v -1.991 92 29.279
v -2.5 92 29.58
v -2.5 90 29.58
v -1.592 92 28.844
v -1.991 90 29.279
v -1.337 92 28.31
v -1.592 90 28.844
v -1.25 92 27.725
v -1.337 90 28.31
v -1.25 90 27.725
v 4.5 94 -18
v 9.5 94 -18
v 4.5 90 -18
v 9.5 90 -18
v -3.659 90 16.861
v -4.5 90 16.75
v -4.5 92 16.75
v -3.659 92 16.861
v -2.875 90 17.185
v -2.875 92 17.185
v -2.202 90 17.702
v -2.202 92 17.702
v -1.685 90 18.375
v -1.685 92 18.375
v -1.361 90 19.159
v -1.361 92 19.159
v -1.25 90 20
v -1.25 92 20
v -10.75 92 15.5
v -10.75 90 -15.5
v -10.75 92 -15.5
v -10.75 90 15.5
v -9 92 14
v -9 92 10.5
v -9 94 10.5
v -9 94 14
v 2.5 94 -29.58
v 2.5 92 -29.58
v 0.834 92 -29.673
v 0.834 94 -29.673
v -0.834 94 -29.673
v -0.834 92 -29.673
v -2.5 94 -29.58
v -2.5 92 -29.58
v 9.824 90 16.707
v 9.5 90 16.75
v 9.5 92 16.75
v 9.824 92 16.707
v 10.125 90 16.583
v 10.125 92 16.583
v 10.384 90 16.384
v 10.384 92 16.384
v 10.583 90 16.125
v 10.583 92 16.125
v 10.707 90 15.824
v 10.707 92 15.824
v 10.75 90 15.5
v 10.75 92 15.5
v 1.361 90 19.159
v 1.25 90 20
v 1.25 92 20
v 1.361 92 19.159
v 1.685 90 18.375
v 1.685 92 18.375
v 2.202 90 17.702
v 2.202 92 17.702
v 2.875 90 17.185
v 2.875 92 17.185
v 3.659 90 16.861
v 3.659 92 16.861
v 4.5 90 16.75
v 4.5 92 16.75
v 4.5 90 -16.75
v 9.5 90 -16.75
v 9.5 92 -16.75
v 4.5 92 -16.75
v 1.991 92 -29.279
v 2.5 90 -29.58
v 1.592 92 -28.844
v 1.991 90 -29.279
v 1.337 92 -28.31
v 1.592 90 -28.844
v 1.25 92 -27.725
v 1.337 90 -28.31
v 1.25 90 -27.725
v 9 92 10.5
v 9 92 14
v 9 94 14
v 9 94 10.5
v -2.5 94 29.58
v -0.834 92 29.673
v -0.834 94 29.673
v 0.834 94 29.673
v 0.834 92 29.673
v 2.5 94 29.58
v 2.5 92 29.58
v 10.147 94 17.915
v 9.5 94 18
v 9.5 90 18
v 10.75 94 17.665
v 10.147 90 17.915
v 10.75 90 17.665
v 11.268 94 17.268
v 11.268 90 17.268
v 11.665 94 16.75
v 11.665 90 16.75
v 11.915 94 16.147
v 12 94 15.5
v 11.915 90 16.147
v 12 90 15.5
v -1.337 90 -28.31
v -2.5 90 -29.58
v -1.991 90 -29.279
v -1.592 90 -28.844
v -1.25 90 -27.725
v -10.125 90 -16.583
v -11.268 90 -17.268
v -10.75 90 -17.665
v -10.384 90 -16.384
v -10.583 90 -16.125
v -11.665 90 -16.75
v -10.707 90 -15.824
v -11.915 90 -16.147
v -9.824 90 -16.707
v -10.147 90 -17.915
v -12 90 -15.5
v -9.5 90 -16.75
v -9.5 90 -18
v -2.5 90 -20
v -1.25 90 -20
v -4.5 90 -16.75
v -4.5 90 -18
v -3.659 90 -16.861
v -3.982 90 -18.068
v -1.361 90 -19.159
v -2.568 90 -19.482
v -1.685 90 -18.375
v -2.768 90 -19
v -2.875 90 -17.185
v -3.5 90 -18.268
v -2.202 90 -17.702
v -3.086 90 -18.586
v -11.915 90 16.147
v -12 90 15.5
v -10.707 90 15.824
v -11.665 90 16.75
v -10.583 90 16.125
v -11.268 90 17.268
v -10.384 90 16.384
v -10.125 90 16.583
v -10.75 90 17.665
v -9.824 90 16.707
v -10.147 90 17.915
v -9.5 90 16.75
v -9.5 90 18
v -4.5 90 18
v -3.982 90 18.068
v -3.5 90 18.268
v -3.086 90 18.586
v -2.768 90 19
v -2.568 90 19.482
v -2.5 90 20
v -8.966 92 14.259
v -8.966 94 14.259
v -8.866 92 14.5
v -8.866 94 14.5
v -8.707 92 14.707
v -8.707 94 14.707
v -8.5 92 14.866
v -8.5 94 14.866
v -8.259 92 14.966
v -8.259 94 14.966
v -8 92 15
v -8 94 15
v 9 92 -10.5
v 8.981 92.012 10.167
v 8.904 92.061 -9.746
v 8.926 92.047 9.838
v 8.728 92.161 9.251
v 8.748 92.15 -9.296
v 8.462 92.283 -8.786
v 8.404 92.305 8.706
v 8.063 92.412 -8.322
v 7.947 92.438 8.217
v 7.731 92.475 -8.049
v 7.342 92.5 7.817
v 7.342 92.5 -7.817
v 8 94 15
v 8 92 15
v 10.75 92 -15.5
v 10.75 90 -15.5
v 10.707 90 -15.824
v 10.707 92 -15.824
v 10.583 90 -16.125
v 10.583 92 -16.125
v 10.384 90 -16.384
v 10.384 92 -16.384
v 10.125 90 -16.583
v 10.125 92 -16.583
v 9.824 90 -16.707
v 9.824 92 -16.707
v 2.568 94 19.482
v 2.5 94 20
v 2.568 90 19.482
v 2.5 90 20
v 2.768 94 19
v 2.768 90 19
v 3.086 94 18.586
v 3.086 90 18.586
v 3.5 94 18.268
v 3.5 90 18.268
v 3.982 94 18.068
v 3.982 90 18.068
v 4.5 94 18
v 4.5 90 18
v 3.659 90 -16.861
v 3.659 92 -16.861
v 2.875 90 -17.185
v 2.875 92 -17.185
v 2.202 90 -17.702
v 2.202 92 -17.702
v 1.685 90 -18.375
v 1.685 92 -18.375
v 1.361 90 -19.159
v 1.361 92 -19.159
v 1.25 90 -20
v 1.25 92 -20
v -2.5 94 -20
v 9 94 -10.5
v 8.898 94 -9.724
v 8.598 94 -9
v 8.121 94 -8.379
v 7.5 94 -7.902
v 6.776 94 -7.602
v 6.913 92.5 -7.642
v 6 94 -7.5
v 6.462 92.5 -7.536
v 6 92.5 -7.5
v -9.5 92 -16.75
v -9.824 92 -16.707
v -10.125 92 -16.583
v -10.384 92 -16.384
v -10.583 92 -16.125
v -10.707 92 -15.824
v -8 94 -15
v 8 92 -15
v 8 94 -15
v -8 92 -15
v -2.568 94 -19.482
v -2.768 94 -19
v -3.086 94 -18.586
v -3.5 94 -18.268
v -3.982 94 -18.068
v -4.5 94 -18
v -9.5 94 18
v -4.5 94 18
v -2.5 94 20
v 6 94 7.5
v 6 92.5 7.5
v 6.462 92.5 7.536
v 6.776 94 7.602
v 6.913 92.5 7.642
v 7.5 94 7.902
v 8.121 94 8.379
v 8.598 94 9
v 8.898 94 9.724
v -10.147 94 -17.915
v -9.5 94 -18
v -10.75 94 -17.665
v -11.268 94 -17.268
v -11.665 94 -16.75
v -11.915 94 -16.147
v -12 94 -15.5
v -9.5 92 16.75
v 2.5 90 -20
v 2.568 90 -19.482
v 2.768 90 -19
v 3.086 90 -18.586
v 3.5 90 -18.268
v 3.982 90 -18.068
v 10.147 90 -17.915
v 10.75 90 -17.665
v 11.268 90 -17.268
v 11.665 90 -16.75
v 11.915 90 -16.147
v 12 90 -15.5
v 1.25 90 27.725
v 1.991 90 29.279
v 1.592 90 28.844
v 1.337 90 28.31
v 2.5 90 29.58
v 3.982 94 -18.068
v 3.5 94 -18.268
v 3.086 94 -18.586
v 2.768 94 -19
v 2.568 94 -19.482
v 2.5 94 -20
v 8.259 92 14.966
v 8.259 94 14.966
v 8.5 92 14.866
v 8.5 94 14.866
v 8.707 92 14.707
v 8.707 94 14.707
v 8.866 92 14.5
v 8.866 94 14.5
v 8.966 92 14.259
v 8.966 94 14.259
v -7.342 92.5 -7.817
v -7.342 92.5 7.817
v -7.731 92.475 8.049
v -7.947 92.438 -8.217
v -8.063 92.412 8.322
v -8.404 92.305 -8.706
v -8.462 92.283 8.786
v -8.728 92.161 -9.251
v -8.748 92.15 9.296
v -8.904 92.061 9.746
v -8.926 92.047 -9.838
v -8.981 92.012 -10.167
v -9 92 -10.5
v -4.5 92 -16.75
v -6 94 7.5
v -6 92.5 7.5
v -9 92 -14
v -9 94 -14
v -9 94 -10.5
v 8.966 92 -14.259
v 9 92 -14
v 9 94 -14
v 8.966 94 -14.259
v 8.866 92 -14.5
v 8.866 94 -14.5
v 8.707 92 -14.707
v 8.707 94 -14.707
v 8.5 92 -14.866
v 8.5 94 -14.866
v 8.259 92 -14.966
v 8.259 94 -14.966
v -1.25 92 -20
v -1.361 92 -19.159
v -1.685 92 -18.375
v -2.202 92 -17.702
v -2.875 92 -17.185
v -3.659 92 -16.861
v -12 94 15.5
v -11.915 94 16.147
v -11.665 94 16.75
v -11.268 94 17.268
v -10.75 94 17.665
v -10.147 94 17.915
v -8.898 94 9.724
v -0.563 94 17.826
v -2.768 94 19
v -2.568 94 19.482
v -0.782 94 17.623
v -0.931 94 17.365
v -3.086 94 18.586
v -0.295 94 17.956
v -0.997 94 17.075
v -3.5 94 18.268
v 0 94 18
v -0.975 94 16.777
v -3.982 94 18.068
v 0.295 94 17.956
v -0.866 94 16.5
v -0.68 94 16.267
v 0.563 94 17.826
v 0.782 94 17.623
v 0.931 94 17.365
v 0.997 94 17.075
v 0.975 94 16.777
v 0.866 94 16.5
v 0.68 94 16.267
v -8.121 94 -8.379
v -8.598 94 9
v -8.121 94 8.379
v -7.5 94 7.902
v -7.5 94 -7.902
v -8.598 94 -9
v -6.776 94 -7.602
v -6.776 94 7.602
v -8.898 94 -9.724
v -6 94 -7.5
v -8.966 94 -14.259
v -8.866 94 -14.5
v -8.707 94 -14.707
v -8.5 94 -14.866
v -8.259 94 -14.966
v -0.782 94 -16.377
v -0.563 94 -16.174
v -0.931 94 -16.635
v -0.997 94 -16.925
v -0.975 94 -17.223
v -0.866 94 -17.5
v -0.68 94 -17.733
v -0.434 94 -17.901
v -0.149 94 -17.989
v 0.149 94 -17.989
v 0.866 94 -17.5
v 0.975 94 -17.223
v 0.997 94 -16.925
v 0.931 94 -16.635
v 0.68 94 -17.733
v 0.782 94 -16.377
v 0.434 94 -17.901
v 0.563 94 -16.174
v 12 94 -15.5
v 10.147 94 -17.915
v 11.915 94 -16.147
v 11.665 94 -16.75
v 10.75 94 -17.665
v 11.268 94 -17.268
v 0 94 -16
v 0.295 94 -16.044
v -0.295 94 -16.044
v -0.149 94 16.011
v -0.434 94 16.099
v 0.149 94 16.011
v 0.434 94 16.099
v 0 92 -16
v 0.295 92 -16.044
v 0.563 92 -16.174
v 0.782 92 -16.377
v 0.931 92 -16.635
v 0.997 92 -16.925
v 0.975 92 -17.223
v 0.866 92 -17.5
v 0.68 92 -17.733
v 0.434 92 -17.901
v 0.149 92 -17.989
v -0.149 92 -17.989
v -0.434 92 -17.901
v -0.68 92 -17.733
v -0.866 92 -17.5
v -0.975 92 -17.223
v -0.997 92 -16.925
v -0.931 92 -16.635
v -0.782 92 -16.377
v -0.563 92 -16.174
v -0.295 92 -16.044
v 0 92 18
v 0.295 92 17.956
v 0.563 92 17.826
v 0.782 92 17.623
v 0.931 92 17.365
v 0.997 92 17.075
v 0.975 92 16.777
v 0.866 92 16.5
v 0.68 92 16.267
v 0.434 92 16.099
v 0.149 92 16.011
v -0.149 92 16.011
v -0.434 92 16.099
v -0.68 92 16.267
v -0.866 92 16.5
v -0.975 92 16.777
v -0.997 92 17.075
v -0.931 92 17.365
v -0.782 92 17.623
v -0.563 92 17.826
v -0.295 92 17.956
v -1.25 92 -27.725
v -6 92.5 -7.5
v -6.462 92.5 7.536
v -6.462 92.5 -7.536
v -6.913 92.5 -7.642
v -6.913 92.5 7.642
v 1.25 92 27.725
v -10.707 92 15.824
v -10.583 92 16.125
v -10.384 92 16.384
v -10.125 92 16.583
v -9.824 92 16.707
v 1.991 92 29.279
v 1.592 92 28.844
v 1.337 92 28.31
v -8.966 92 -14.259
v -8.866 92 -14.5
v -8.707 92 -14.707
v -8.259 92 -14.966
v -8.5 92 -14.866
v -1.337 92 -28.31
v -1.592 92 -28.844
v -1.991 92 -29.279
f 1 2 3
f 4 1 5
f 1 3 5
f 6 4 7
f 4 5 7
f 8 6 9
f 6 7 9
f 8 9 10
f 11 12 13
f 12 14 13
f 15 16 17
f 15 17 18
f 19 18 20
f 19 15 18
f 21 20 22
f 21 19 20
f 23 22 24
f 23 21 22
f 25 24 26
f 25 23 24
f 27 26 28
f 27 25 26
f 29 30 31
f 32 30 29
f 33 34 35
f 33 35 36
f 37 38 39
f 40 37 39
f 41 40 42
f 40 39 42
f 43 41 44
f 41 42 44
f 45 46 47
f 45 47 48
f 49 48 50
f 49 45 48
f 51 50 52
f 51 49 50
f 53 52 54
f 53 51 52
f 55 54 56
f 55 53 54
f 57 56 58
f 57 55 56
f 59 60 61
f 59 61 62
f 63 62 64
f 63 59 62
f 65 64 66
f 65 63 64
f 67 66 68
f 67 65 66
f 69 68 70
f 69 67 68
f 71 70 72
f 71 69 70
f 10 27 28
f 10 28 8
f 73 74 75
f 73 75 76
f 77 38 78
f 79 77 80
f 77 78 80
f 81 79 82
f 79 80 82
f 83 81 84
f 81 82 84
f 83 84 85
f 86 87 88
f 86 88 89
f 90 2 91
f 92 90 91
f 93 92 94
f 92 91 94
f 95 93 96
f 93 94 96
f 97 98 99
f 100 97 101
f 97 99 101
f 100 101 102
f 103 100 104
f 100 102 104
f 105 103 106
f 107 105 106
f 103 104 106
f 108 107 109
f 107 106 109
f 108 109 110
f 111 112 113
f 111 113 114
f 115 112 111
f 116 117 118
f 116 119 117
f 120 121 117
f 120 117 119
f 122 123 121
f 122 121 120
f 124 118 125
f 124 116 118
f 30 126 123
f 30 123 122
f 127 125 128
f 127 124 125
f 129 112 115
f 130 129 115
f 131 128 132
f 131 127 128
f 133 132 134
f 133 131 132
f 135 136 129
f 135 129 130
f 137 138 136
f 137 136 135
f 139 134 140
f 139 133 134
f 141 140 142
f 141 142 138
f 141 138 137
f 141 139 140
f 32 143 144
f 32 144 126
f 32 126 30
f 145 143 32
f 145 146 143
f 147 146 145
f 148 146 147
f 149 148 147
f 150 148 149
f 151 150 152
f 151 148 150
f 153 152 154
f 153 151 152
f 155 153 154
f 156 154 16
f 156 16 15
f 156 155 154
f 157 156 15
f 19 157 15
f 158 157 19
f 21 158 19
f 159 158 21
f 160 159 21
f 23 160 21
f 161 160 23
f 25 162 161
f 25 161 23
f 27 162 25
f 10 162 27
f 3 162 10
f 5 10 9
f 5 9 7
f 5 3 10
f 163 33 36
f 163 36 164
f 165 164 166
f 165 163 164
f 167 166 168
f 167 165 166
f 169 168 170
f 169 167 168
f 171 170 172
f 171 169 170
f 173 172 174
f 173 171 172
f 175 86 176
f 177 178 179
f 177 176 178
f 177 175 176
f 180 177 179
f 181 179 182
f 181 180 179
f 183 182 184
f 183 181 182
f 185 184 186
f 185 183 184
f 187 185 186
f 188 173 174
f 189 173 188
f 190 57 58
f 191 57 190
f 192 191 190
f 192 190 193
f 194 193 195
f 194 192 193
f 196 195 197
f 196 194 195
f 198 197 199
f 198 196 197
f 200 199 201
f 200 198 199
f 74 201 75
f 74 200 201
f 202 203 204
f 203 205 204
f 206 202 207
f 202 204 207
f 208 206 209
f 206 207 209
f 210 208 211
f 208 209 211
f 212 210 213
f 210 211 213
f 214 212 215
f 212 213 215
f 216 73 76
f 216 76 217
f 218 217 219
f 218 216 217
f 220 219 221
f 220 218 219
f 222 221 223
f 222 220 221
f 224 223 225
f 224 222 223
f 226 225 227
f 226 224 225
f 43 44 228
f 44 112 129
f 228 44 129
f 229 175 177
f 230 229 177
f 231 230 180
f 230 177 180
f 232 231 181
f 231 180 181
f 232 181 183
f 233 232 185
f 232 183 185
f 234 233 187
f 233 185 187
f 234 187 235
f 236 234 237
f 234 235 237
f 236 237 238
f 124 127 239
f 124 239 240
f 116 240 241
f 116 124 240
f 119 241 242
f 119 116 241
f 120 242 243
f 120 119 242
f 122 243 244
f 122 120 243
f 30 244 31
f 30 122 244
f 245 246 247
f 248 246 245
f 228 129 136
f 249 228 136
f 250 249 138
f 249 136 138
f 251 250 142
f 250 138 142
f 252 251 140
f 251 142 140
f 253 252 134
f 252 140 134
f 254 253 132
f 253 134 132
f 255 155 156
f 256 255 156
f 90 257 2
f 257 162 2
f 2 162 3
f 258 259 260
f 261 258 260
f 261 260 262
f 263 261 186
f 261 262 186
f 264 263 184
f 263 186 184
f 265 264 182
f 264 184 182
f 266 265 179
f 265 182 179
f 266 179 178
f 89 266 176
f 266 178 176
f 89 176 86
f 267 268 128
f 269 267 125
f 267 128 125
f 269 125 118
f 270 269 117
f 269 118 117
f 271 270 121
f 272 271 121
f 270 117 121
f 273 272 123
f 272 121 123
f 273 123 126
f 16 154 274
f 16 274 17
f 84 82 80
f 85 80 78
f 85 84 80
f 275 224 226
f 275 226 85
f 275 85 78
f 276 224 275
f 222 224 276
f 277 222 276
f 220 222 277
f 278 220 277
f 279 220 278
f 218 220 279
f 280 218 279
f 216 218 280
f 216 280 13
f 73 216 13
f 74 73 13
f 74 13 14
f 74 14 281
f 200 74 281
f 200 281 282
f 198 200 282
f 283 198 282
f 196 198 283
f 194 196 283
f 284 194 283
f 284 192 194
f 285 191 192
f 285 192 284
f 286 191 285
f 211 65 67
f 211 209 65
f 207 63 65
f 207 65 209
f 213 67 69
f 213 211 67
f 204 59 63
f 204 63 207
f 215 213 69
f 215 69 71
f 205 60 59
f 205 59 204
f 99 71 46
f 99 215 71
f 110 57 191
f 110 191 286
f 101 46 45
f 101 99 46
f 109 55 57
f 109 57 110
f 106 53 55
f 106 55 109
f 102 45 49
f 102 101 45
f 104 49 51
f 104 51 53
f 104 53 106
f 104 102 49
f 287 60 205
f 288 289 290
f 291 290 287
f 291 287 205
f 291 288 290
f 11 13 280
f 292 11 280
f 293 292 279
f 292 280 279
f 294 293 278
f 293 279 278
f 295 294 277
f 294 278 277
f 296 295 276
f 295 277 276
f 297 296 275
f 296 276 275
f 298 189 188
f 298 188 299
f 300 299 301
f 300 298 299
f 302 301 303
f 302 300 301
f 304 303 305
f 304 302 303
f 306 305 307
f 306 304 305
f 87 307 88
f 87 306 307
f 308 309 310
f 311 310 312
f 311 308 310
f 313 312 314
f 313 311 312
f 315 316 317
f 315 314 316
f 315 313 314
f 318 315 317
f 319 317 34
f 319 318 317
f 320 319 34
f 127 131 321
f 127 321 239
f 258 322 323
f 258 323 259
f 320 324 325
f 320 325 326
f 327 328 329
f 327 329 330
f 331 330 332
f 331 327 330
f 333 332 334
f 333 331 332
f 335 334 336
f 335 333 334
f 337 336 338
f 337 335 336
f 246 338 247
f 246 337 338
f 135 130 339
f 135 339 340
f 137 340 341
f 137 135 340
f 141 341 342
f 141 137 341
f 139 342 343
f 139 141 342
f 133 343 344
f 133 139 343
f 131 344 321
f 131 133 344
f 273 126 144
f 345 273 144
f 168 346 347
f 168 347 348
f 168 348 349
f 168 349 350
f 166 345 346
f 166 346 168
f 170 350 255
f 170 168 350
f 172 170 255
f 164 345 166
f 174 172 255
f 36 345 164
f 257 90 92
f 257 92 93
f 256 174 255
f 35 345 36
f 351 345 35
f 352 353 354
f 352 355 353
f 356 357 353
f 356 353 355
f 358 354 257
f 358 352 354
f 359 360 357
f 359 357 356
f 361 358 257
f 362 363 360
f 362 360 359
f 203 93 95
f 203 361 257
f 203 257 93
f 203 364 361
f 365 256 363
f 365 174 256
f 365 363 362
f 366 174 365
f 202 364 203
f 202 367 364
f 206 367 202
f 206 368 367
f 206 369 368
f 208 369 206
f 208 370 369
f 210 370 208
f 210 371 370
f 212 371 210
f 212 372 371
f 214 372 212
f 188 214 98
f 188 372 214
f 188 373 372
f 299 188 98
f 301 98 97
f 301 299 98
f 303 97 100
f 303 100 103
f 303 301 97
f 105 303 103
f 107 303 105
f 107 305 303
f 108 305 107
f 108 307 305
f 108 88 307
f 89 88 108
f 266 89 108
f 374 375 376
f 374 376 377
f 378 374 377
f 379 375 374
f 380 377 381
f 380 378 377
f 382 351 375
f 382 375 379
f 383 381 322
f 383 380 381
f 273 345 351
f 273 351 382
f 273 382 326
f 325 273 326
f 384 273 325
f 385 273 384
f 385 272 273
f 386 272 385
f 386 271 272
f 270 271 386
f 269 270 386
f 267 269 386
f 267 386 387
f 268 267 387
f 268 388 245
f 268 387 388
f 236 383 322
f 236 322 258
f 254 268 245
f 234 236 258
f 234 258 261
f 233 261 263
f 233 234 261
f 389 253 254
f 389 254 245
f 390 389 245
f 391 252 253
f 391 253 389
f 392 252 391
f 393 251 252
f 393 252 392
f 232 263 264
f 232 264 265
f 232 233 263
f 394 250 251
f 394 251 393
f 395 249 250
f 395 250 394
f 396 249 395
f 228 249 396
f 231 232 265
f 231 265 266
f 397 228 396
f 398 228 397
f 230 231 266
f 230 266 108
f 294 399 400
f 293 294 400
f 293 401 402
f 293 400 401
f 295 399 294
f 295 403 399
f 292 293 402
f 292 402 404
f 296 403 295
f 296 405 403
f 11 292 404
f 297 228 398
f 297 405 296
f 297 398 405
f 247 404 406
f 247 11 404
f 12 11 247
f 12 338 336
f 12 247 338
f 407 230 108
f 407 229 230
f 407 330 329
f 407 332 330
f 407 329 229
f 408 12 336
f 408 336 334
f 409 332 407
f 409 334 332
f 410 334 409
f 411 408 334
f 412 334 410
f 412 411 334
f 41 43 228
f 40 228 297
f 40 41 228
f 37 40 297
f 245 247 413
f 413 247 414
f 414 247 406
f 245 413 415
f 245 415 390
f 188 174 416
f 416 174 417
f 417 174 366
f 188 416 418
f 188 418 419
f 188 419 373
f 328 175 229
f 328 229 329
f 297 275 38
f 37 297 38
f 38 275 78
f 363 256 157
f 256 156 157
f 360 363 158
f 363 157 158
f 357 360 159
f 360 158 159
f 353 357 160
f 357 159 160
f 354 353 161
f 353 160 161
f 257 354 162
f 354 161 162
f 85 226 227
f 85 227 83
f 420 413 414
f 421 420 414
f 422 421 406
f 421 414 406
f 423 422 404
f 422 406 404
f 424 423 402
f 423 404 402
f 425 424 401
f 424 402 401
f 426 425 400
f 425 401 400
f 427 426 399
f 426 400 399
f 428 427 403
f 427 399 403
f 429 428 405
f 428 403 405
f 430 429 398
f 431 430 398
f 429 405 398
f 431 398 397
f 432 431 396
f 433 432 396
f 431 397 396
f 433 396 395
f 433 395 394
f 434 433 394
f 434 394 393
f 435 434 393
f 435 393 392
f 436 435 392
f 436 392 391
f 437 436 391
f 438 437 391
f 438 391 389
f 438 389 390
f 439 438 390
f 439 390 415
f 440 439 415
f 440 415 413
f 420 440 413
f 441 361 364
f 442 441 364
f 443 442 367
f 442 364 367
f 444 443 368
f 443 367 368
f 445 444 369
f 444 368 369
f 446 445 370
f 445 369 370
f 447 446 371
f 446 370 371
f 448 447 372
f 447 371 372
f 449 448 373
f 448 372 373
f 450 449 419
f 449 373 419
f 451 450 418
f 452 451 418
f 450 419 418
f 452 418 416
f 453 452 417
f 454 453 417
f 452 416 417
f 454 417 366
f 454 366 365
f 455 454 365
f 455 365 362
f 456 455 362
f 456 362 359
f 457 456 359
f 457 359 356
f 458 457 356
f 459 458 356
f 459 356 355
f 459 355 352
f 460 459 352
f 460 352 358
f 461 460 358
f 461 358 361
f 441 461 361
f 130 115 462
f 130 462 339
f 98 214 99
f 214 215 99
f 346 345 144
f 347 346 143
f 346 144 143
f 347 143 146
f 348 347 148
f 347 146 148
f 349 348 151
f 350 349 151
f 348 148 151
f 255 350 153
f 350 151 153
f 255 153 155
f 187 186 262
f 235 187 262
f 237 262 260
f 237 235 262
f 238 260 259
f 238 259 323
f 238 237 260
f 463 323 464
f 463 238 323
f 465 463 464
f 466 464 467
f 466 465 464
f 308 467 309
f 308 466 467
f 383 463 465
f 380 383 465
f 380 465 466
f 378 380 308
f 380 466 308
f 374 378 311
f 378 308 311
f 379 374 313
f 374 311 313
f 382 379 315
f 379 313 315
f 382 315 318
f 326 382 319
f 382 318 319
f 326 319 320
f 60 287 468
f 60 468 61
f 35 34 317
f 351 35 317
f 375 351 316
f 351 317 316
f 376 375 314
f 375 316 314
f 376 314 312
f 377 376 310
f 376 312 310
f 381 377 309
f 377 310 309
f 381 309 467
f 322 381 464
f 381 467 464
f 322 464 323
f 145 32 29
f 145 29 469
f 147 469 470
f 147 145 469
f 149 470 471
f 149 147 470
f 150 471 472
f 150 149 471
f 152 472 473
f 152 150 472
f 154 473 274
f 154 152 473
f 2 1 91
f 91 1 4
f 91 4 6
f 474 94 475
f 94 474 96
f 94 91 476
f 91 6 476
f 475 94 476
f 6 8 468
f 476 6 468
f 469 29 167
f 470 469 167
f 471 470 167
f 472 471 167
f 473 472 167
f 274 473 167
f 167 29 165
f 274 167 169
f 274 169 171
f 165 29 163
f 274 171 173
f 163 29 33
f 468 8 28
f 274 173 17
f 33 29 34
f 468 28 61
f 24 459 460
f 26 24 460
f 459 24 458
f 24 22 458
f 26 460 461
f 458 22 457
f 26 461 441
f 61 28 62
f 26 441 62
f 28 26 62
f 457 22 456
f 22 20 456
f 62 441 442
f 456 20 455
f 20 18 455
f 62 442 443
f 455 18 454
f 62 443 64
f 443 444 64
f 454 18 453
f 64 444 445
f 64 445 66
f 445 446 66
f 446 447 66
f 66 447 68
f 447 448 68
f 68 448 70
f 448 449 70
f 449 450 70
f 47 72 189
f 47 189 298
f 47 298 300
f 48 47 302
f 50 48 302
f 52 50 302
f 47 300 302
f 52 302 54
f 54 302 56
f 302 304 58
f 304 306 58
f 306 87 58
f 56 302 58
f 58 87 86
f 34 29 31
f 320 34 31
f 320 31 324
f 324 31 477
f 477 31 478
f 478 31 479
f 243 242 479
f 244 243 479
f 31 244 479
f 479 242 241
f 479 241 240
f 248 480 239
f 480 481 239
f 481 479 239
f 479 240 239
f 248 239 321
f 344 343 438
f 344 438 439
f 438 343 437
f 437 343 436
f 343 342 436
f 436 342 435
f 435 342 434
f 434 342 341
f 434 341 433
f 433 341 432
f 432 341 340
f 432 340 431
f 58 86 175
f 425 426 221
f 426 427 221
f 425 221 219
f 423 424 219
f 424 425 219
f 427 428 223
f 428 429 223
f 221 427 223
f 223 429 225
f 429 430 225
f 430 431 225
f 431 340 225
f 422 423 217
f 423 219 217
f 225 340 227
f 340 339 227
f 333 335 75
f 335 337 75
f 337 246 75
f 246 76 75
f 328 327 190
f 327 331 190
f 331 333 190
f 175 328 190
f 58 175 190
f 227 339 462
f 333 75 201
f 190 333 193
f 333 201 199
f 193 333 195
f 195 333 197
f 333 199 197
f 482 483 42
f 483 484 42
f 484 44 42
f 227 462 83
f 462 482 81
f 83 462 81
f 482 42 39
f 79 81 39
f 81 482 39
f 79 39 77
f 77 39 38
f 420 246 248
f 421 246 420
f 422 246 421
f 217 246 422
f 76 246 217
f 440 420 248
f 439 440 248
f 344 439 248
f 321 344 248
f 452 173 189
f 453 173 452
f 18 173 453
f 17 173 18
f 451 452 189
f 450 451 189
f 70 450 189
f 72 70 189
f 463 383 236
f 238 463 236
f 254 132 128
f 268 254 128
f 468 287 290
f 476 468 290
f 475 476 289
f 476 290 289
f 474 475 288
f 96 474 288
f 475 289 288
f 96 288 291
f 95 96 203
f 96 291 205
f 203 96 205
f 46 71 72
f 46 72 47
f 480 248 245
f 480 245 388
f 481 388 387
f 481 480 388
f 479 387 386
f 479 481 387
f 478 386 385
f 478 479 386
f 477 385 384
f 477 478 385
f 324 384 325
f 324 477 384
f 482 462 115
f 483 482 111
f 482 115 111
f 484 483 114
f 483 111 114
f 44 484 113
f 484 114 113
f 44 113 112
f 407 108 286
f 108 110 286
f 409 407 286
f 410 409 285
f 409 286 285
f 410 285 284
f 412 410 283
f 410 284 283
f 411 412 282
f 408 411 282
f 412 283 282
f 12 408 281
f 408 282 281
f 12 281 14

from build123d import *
from build123d.topology import SkipClean

# Parameters (mm, degrees)
BATTERY_HOLDER_OUTLINE_DEPTH        = 2
LIP_START                           = 2
LIP_DEPTH                           = 2
SKETCH4_R                           = 1
SCREWHOLE_DEPTH                     = 10
SKETCH5_W                           = 18
SKETCH5_H                           = 15
ACTUAL_BATTERY_CAP_THINGY_DEPTH     = 1.5
FILLETS_START                       = 91.999999219
FILLETS_FOR_THE_THING_ABOVE_DEPTH   = 2.000000781
FILLETS_START_2                     = -12
FILLETS_FOR_THE_THING_ABOVE_2_DEPTH = 23
FILLETS_AT_EDGE_R                   = 2


with BuildPart() as part:
    # Sketch2 → Battery holder outline (new body)
    with BuildSketch(Plane(origin=(0, 92, 0), x_dir=(1, 0, 0), z_dir=(0, 1, 0))):
        with BuildLine():
            Line((-9.5, -18), (-4.5, -18))
            ThreePointArc((-4.5, -18), (-3.085786438, -18.585786438), (-2.5, -20))
            Line((-2.5, -20), (-2.5, -29.579540649))
            ThreePointArc((-2.5, -29.579540649), (0, -29.685), (2.5, -29.579540649))
            Line((2.5, -29.579540649), (2.5, -20))
            ThreePointArc((2.5, -20), (3.085786438, -18.585786438), (4.5, -18))
            Line((4.5, -18), (9.5, -18))
            ThreePointArc((9.5, -18), (11.267766953, -17.267766953), (12, -15.5))
            Line((12, -15.5), (12, 15.5))
            ThreePointArc((12, 15.5), (11.267766953, 17.267766953), (9.5, 18))
            Line((9.5, 18), (4.5, 18))
            ThreePointArc((4.5, 18), (3.085786438, 18.585786438), (2.5, 20))
            Line((2.5, 20), (2.5, 29.579540649))
            ThreePointArc((2.5, 29.579540649), (0, 29.685), (-2.5, 29.579540649))
            Line((-2.5, 29.579540649), (-2.5, 20))
            ThreePointArc((-2.5, 20), (-3.085786438, 18.585786438), (-4.5, 18))
            Line((-4.5, 18), (-9.5, 18))
            ThreePointArc((-9.5, 18), (-11.267766953, 17.267766953), (-12, 15.5))
            Line((-12, 15.5), (-12, -15.5))
            ThreePointArc((-12, -15.5), (-11.267766953, -17.267766953), (-9.5, -18))
        make_face()
        with BuildLine():
            Line((8, 15), (-8, 15))
            ThreePointArc((-8, 15), (-8.707106781, 14.707106781), (-9, 14))
            Line((-9, 14), (-9, -14))
            ThreePointArc((-9, -14), (-8.707106781, -14.707106781), (-8, -15))
            Line((-8, -15), (8, -15))
            ThreePointArc((8, -15), (8.707106781, -14.707106781), (9, -14))
            Line((9, -14), (9, 14))
            ThreePointArc((9, 14), (8.707106781, 14.707106781), (8, 15))
        make_face(mode=Mode.SUBTRACT)
    extrude(amount=BATTERY_HOLDER_OUTLINE_DEPTH)

    # Sketch3 → Lip (add)
    with SkipClean():  # the faces are left unmerged after this step: merging them gives an invalid solid
        with BuildSketch(Plane.XZ.offset(-92).offset(LIP_START)):
            with BuildLine():
                Line((2.5, 20), (2.5, 29.579540649))
                ThreePointArc((2.5, 29.579540649), (1.875417387, 29.625698888), (1.25, 29.658670317))
                Line((1.25, 29.658670317), (1.25, 28.407511771))
                Line((1.25, 28.407511771), (1.25, 20))
                ThreePointArc((1.25, 20), (2.201902961, 17.701902961), (4.5, 16.75))
                Line((4.5, 16.75), (9.5, 16.75))
                ThreePointArc((9.5, 16.75), (10.383883476, 16.383883476), (10.75, 15.5))
                Line((10.75, 15.5), (10.75, -15.5))
                ThreePointArc((10.75, -15.5), (10.383883476, -16.383883476), (9.5, -16.75))
                Line((9.5, -16.75), (4.5, -16.75))
                ThreePointArc((4.5, -16.75), (2.201902961, -17.701902961), (1.25, -20))
                Line((1.25, -20), (1.25, -28.407511771))
                Line((1.25, -28.407511771), (1.25, -29.658670317))
                ThreePointArc((1.25, -29.658670317), (1.875417387, -29.625698888), (2.5, -29.579540649))
                Line((2.5, -29.579540649), (2.5, -20))
                ThreePointArc((2.5, -20), (3.085786438, -18.585786438), (4.5, -18))
                Line((4.5, -18), (9.5, -18))
                ThreePointArc((9.5, -18), (11.267766953, -17.267766953), (12, -15.5))
                Line((12, -15.5), (12, 15.5))
                ThreePointArc((12, 15.5), (11.267766953, 17.267766953), (9.5, 18))
                Line((9.5, 18), (4.5, 18))
                ThreePointArc((4.5, 18), (3.085786438, 18.585786438), (2.5, 20))
            make_face()
            with BuildLine():
                Line((-2.5, -20), (-2.5, -29.579540649))
                ThreePointArc((-2.5, -29.579540649), (-1.875417387, -29.625698888), (-1.25, -29.658670317))
                Line((-1.25, -29.658670317), (-1.25, -28.407511771))
                Line((-1.25, -28.407511771), (-1.25, -20))
                ThreePointArc((-1.25, -20), (-2.201902961, -17.701902961), (-4.5, -16.75))
                Line((-4.5, -16.75), (-9.5, -16.75))
                ThreePointArc((-9.5, -16.75), (-10.383883476, -16.383883476), (-10.75, -15.5))
                Line((-10.75, -15.5), (-10.75, 15.5))
                ThreePointArc((-10.75, 15.5), (-10.383883476, 16.383883476), (-9.5, 16.75))
                Line((-9.5, 16.75), (-4.5, 16.75))
                ThreePointArc((-4.5, 16.75), (-2.201902961, 17.701902961), (-1.25, 20))
                Line((-1.25, 20), (-1.25, 28.407511771))
                Line((-1.25, 28.407511771), (-1.25, 29.658670317))
                ThreePointArc((-1.25, 29.658670317), (-1.875417387, 29.625698888), (-2.5, 29.579540649))
                Line((-2.5, 29.579540649), (-2.5, 20))
                ThreePointArc((-2.5, 20), (-3.085786438, 18.585786438), (-4.5, 18))
                Line((-4.5, 18), (-9.5, 18))
                ThreePointArc((-9.5, 18), (-11.267766953, 17.267766953), (-12, 15.5))
                Line((-12, 15.5), (-12, -15.5))
                ThreePointArc((-12, -15.5), (-11.267766953, -17.267766953), (-9.5, -18))
                Line((-9.5, -18), (-4.5, -18))
                ThreePointArc((-4.5, -18), (-3.085786438, -18.585786438), (-2.5, -20))
            make_face()
        extrude(amount=-LIP_DEPTH)

    # Sketch4 → Screwhole (cut)
    with SkipClean():  # the faces are left unmerged after this step: merging them gives an invalid solid
        with BuildSketch(Plane(origin=(0, 94, 0), x_dir=(1, 0, 0), z_dir=(0, 1, 0))):
            with Locations(Location((0, 17, 0), (0, 0, 270))):
                Circle(SKETCH4_R)
            with Locations(Location((0, -17, 0), (0, 0, 270))):
                Circle(SKETCH4_R)
        extrude(amount=-SCREWHOLE_DEPTH, mode=Mode.SUBTRACT)

    # Sketch5 → Actual battery cap thingy (add)
    with SkipClean():  # the faces are left unmerged after this step: merging them gives an invalid solid
        with BuildSketch(Plane(origin=(0, 94, 0), x_dir=(1, 0, 0), z_dir=(0, 1, 0))):
            Rectangle(SKETCH5_W, SKETCH5_H)
        extrude(amount=-ACTUAL_BATTERY_CAP_THINGY_DEPTH)

    # Fillets for the thing above: read off the stored shape, not the designer's step
    # Fillets for the thing above outline → Fillets for the thing above (add)
    with SkipClean():  # the faces are left unmerged after this step: merging them gives an invalid solid
        with BuildSketch(Plane(origin=(0, 0, 0), x_dir=(1, 0, 0), z_dir=(0, 1, 0)).offset(FILLETS_START)):
            with BuildLine():
                ThreePointArc((9, 10.5), (8.121320344, 8.378679656), (6, 7.5))
                Line((6, 7.5), (-6, 7.5))
                ThreePointArc((-6, 7.5), (-8.121320344, 8.378679656), (-9, 10.5))
                Line((-9, 10.5), (-9, -10.5))
                ThreePointArc((-9, -10.5), (-8.121320344, -8.378679656), (-6, -7.5))
                Line((-6, -7.5), (6, -7.5))
                ThreePointArc((6, -7.5), (8.121320344, -8.378679656), (9, -10.5))
                Line((9, -10.5), (9, 10.5))
            make_face()
        extrude(amount=FILLETS_FOR_THE_THING_ABOVE_DEPTH)

    # Fillets for the thing above 2 outline → Fillets for the thing above 2 (cut)
    with SkipClean():  # the faces are left unmerged after this step: merging them gives an invalid solid
        with BuildSketch(Plane.XY.offset(FILLETS_START_2)):
            with BuildLine():
                ThreePointArc((9.000010237, 91.99999321), (8.207718889, 92.37227955), (7.341687605, 92.5))
                Line((7.341687605, 92.5), (-7.341687605, 92.5))
                ThreePointArc((-7.341687605, 92.5), (-8.207718889, 92.37227955), (-9.000010237, 91.99999321))
                Line((-9.000010237, 91.99999321), (9.000010237, 91.99999321))
            make_face()
        extrude(amount=FILLETS_FOR_THE_THING_ABOVE_2_DEPTH, mode=Mode.SUBTRACT)

    # Fillets at edge
    # the kernel refuses this fillet: 2 mm, written as the material it takes off along each edge
    with BuildSketch(Plane(origin=(-1.25, 85.167051774, -29.658670317), x_dir=(-0.9980023206455083, 0, 0.06317727428577244), z_dir=(0, 1, 0)), Plane(origin=(1.25, 85.167051774, 29.658670317), x_dir=(0.9980023206455083, 0, -0.06317727428577508), z_dir=(0, 1, 0))) as fillets_at_edge_piece_1:
        with BuildLine():
            CenterArc((2.11813764, 1.802962869), FILLETS_AT_EDGE_R, 176.377796501, 67.975687163)
            Line((0.122132998, 1.929317418), (0, 0))
            ThreePointArc((0, 0), (0.626251049, -0.006606603), (1.252502098, 0))
        make_face()
    extrude(amount=6.832948226, mode=Mode.SUBTRACT)
    with BuildSketch(Plane(origin=(1.25, 85.167051774, -29.658670317), x_dir=(0.998002320645508, 0, 0.06317727428577799), z_dir=(0, 1, 0)), Plane(origin=(-1.25, 85.167051774, 29.658670317), x_dir=(-0.998002320645508, 0, -0.06317727428577828), z_dir=(0, 1, 0))) as fillets_at_edge_piece_2:
        with BuildLine():
            CenterArc((2.11813764, -1.802962869), FILLETS_AT_EDGE_R, 115.646516337, 67.975687163)
            Line((0.122132998, -1.929317418), (0, 0))
            ThreePointArc((0, 0), (0.626251049, 0.006606603), (1.252502098, 0))
        make_face()
    extrude(amount=6.832948226, mode=Mode.SUBTRACT)


solid = part.part
